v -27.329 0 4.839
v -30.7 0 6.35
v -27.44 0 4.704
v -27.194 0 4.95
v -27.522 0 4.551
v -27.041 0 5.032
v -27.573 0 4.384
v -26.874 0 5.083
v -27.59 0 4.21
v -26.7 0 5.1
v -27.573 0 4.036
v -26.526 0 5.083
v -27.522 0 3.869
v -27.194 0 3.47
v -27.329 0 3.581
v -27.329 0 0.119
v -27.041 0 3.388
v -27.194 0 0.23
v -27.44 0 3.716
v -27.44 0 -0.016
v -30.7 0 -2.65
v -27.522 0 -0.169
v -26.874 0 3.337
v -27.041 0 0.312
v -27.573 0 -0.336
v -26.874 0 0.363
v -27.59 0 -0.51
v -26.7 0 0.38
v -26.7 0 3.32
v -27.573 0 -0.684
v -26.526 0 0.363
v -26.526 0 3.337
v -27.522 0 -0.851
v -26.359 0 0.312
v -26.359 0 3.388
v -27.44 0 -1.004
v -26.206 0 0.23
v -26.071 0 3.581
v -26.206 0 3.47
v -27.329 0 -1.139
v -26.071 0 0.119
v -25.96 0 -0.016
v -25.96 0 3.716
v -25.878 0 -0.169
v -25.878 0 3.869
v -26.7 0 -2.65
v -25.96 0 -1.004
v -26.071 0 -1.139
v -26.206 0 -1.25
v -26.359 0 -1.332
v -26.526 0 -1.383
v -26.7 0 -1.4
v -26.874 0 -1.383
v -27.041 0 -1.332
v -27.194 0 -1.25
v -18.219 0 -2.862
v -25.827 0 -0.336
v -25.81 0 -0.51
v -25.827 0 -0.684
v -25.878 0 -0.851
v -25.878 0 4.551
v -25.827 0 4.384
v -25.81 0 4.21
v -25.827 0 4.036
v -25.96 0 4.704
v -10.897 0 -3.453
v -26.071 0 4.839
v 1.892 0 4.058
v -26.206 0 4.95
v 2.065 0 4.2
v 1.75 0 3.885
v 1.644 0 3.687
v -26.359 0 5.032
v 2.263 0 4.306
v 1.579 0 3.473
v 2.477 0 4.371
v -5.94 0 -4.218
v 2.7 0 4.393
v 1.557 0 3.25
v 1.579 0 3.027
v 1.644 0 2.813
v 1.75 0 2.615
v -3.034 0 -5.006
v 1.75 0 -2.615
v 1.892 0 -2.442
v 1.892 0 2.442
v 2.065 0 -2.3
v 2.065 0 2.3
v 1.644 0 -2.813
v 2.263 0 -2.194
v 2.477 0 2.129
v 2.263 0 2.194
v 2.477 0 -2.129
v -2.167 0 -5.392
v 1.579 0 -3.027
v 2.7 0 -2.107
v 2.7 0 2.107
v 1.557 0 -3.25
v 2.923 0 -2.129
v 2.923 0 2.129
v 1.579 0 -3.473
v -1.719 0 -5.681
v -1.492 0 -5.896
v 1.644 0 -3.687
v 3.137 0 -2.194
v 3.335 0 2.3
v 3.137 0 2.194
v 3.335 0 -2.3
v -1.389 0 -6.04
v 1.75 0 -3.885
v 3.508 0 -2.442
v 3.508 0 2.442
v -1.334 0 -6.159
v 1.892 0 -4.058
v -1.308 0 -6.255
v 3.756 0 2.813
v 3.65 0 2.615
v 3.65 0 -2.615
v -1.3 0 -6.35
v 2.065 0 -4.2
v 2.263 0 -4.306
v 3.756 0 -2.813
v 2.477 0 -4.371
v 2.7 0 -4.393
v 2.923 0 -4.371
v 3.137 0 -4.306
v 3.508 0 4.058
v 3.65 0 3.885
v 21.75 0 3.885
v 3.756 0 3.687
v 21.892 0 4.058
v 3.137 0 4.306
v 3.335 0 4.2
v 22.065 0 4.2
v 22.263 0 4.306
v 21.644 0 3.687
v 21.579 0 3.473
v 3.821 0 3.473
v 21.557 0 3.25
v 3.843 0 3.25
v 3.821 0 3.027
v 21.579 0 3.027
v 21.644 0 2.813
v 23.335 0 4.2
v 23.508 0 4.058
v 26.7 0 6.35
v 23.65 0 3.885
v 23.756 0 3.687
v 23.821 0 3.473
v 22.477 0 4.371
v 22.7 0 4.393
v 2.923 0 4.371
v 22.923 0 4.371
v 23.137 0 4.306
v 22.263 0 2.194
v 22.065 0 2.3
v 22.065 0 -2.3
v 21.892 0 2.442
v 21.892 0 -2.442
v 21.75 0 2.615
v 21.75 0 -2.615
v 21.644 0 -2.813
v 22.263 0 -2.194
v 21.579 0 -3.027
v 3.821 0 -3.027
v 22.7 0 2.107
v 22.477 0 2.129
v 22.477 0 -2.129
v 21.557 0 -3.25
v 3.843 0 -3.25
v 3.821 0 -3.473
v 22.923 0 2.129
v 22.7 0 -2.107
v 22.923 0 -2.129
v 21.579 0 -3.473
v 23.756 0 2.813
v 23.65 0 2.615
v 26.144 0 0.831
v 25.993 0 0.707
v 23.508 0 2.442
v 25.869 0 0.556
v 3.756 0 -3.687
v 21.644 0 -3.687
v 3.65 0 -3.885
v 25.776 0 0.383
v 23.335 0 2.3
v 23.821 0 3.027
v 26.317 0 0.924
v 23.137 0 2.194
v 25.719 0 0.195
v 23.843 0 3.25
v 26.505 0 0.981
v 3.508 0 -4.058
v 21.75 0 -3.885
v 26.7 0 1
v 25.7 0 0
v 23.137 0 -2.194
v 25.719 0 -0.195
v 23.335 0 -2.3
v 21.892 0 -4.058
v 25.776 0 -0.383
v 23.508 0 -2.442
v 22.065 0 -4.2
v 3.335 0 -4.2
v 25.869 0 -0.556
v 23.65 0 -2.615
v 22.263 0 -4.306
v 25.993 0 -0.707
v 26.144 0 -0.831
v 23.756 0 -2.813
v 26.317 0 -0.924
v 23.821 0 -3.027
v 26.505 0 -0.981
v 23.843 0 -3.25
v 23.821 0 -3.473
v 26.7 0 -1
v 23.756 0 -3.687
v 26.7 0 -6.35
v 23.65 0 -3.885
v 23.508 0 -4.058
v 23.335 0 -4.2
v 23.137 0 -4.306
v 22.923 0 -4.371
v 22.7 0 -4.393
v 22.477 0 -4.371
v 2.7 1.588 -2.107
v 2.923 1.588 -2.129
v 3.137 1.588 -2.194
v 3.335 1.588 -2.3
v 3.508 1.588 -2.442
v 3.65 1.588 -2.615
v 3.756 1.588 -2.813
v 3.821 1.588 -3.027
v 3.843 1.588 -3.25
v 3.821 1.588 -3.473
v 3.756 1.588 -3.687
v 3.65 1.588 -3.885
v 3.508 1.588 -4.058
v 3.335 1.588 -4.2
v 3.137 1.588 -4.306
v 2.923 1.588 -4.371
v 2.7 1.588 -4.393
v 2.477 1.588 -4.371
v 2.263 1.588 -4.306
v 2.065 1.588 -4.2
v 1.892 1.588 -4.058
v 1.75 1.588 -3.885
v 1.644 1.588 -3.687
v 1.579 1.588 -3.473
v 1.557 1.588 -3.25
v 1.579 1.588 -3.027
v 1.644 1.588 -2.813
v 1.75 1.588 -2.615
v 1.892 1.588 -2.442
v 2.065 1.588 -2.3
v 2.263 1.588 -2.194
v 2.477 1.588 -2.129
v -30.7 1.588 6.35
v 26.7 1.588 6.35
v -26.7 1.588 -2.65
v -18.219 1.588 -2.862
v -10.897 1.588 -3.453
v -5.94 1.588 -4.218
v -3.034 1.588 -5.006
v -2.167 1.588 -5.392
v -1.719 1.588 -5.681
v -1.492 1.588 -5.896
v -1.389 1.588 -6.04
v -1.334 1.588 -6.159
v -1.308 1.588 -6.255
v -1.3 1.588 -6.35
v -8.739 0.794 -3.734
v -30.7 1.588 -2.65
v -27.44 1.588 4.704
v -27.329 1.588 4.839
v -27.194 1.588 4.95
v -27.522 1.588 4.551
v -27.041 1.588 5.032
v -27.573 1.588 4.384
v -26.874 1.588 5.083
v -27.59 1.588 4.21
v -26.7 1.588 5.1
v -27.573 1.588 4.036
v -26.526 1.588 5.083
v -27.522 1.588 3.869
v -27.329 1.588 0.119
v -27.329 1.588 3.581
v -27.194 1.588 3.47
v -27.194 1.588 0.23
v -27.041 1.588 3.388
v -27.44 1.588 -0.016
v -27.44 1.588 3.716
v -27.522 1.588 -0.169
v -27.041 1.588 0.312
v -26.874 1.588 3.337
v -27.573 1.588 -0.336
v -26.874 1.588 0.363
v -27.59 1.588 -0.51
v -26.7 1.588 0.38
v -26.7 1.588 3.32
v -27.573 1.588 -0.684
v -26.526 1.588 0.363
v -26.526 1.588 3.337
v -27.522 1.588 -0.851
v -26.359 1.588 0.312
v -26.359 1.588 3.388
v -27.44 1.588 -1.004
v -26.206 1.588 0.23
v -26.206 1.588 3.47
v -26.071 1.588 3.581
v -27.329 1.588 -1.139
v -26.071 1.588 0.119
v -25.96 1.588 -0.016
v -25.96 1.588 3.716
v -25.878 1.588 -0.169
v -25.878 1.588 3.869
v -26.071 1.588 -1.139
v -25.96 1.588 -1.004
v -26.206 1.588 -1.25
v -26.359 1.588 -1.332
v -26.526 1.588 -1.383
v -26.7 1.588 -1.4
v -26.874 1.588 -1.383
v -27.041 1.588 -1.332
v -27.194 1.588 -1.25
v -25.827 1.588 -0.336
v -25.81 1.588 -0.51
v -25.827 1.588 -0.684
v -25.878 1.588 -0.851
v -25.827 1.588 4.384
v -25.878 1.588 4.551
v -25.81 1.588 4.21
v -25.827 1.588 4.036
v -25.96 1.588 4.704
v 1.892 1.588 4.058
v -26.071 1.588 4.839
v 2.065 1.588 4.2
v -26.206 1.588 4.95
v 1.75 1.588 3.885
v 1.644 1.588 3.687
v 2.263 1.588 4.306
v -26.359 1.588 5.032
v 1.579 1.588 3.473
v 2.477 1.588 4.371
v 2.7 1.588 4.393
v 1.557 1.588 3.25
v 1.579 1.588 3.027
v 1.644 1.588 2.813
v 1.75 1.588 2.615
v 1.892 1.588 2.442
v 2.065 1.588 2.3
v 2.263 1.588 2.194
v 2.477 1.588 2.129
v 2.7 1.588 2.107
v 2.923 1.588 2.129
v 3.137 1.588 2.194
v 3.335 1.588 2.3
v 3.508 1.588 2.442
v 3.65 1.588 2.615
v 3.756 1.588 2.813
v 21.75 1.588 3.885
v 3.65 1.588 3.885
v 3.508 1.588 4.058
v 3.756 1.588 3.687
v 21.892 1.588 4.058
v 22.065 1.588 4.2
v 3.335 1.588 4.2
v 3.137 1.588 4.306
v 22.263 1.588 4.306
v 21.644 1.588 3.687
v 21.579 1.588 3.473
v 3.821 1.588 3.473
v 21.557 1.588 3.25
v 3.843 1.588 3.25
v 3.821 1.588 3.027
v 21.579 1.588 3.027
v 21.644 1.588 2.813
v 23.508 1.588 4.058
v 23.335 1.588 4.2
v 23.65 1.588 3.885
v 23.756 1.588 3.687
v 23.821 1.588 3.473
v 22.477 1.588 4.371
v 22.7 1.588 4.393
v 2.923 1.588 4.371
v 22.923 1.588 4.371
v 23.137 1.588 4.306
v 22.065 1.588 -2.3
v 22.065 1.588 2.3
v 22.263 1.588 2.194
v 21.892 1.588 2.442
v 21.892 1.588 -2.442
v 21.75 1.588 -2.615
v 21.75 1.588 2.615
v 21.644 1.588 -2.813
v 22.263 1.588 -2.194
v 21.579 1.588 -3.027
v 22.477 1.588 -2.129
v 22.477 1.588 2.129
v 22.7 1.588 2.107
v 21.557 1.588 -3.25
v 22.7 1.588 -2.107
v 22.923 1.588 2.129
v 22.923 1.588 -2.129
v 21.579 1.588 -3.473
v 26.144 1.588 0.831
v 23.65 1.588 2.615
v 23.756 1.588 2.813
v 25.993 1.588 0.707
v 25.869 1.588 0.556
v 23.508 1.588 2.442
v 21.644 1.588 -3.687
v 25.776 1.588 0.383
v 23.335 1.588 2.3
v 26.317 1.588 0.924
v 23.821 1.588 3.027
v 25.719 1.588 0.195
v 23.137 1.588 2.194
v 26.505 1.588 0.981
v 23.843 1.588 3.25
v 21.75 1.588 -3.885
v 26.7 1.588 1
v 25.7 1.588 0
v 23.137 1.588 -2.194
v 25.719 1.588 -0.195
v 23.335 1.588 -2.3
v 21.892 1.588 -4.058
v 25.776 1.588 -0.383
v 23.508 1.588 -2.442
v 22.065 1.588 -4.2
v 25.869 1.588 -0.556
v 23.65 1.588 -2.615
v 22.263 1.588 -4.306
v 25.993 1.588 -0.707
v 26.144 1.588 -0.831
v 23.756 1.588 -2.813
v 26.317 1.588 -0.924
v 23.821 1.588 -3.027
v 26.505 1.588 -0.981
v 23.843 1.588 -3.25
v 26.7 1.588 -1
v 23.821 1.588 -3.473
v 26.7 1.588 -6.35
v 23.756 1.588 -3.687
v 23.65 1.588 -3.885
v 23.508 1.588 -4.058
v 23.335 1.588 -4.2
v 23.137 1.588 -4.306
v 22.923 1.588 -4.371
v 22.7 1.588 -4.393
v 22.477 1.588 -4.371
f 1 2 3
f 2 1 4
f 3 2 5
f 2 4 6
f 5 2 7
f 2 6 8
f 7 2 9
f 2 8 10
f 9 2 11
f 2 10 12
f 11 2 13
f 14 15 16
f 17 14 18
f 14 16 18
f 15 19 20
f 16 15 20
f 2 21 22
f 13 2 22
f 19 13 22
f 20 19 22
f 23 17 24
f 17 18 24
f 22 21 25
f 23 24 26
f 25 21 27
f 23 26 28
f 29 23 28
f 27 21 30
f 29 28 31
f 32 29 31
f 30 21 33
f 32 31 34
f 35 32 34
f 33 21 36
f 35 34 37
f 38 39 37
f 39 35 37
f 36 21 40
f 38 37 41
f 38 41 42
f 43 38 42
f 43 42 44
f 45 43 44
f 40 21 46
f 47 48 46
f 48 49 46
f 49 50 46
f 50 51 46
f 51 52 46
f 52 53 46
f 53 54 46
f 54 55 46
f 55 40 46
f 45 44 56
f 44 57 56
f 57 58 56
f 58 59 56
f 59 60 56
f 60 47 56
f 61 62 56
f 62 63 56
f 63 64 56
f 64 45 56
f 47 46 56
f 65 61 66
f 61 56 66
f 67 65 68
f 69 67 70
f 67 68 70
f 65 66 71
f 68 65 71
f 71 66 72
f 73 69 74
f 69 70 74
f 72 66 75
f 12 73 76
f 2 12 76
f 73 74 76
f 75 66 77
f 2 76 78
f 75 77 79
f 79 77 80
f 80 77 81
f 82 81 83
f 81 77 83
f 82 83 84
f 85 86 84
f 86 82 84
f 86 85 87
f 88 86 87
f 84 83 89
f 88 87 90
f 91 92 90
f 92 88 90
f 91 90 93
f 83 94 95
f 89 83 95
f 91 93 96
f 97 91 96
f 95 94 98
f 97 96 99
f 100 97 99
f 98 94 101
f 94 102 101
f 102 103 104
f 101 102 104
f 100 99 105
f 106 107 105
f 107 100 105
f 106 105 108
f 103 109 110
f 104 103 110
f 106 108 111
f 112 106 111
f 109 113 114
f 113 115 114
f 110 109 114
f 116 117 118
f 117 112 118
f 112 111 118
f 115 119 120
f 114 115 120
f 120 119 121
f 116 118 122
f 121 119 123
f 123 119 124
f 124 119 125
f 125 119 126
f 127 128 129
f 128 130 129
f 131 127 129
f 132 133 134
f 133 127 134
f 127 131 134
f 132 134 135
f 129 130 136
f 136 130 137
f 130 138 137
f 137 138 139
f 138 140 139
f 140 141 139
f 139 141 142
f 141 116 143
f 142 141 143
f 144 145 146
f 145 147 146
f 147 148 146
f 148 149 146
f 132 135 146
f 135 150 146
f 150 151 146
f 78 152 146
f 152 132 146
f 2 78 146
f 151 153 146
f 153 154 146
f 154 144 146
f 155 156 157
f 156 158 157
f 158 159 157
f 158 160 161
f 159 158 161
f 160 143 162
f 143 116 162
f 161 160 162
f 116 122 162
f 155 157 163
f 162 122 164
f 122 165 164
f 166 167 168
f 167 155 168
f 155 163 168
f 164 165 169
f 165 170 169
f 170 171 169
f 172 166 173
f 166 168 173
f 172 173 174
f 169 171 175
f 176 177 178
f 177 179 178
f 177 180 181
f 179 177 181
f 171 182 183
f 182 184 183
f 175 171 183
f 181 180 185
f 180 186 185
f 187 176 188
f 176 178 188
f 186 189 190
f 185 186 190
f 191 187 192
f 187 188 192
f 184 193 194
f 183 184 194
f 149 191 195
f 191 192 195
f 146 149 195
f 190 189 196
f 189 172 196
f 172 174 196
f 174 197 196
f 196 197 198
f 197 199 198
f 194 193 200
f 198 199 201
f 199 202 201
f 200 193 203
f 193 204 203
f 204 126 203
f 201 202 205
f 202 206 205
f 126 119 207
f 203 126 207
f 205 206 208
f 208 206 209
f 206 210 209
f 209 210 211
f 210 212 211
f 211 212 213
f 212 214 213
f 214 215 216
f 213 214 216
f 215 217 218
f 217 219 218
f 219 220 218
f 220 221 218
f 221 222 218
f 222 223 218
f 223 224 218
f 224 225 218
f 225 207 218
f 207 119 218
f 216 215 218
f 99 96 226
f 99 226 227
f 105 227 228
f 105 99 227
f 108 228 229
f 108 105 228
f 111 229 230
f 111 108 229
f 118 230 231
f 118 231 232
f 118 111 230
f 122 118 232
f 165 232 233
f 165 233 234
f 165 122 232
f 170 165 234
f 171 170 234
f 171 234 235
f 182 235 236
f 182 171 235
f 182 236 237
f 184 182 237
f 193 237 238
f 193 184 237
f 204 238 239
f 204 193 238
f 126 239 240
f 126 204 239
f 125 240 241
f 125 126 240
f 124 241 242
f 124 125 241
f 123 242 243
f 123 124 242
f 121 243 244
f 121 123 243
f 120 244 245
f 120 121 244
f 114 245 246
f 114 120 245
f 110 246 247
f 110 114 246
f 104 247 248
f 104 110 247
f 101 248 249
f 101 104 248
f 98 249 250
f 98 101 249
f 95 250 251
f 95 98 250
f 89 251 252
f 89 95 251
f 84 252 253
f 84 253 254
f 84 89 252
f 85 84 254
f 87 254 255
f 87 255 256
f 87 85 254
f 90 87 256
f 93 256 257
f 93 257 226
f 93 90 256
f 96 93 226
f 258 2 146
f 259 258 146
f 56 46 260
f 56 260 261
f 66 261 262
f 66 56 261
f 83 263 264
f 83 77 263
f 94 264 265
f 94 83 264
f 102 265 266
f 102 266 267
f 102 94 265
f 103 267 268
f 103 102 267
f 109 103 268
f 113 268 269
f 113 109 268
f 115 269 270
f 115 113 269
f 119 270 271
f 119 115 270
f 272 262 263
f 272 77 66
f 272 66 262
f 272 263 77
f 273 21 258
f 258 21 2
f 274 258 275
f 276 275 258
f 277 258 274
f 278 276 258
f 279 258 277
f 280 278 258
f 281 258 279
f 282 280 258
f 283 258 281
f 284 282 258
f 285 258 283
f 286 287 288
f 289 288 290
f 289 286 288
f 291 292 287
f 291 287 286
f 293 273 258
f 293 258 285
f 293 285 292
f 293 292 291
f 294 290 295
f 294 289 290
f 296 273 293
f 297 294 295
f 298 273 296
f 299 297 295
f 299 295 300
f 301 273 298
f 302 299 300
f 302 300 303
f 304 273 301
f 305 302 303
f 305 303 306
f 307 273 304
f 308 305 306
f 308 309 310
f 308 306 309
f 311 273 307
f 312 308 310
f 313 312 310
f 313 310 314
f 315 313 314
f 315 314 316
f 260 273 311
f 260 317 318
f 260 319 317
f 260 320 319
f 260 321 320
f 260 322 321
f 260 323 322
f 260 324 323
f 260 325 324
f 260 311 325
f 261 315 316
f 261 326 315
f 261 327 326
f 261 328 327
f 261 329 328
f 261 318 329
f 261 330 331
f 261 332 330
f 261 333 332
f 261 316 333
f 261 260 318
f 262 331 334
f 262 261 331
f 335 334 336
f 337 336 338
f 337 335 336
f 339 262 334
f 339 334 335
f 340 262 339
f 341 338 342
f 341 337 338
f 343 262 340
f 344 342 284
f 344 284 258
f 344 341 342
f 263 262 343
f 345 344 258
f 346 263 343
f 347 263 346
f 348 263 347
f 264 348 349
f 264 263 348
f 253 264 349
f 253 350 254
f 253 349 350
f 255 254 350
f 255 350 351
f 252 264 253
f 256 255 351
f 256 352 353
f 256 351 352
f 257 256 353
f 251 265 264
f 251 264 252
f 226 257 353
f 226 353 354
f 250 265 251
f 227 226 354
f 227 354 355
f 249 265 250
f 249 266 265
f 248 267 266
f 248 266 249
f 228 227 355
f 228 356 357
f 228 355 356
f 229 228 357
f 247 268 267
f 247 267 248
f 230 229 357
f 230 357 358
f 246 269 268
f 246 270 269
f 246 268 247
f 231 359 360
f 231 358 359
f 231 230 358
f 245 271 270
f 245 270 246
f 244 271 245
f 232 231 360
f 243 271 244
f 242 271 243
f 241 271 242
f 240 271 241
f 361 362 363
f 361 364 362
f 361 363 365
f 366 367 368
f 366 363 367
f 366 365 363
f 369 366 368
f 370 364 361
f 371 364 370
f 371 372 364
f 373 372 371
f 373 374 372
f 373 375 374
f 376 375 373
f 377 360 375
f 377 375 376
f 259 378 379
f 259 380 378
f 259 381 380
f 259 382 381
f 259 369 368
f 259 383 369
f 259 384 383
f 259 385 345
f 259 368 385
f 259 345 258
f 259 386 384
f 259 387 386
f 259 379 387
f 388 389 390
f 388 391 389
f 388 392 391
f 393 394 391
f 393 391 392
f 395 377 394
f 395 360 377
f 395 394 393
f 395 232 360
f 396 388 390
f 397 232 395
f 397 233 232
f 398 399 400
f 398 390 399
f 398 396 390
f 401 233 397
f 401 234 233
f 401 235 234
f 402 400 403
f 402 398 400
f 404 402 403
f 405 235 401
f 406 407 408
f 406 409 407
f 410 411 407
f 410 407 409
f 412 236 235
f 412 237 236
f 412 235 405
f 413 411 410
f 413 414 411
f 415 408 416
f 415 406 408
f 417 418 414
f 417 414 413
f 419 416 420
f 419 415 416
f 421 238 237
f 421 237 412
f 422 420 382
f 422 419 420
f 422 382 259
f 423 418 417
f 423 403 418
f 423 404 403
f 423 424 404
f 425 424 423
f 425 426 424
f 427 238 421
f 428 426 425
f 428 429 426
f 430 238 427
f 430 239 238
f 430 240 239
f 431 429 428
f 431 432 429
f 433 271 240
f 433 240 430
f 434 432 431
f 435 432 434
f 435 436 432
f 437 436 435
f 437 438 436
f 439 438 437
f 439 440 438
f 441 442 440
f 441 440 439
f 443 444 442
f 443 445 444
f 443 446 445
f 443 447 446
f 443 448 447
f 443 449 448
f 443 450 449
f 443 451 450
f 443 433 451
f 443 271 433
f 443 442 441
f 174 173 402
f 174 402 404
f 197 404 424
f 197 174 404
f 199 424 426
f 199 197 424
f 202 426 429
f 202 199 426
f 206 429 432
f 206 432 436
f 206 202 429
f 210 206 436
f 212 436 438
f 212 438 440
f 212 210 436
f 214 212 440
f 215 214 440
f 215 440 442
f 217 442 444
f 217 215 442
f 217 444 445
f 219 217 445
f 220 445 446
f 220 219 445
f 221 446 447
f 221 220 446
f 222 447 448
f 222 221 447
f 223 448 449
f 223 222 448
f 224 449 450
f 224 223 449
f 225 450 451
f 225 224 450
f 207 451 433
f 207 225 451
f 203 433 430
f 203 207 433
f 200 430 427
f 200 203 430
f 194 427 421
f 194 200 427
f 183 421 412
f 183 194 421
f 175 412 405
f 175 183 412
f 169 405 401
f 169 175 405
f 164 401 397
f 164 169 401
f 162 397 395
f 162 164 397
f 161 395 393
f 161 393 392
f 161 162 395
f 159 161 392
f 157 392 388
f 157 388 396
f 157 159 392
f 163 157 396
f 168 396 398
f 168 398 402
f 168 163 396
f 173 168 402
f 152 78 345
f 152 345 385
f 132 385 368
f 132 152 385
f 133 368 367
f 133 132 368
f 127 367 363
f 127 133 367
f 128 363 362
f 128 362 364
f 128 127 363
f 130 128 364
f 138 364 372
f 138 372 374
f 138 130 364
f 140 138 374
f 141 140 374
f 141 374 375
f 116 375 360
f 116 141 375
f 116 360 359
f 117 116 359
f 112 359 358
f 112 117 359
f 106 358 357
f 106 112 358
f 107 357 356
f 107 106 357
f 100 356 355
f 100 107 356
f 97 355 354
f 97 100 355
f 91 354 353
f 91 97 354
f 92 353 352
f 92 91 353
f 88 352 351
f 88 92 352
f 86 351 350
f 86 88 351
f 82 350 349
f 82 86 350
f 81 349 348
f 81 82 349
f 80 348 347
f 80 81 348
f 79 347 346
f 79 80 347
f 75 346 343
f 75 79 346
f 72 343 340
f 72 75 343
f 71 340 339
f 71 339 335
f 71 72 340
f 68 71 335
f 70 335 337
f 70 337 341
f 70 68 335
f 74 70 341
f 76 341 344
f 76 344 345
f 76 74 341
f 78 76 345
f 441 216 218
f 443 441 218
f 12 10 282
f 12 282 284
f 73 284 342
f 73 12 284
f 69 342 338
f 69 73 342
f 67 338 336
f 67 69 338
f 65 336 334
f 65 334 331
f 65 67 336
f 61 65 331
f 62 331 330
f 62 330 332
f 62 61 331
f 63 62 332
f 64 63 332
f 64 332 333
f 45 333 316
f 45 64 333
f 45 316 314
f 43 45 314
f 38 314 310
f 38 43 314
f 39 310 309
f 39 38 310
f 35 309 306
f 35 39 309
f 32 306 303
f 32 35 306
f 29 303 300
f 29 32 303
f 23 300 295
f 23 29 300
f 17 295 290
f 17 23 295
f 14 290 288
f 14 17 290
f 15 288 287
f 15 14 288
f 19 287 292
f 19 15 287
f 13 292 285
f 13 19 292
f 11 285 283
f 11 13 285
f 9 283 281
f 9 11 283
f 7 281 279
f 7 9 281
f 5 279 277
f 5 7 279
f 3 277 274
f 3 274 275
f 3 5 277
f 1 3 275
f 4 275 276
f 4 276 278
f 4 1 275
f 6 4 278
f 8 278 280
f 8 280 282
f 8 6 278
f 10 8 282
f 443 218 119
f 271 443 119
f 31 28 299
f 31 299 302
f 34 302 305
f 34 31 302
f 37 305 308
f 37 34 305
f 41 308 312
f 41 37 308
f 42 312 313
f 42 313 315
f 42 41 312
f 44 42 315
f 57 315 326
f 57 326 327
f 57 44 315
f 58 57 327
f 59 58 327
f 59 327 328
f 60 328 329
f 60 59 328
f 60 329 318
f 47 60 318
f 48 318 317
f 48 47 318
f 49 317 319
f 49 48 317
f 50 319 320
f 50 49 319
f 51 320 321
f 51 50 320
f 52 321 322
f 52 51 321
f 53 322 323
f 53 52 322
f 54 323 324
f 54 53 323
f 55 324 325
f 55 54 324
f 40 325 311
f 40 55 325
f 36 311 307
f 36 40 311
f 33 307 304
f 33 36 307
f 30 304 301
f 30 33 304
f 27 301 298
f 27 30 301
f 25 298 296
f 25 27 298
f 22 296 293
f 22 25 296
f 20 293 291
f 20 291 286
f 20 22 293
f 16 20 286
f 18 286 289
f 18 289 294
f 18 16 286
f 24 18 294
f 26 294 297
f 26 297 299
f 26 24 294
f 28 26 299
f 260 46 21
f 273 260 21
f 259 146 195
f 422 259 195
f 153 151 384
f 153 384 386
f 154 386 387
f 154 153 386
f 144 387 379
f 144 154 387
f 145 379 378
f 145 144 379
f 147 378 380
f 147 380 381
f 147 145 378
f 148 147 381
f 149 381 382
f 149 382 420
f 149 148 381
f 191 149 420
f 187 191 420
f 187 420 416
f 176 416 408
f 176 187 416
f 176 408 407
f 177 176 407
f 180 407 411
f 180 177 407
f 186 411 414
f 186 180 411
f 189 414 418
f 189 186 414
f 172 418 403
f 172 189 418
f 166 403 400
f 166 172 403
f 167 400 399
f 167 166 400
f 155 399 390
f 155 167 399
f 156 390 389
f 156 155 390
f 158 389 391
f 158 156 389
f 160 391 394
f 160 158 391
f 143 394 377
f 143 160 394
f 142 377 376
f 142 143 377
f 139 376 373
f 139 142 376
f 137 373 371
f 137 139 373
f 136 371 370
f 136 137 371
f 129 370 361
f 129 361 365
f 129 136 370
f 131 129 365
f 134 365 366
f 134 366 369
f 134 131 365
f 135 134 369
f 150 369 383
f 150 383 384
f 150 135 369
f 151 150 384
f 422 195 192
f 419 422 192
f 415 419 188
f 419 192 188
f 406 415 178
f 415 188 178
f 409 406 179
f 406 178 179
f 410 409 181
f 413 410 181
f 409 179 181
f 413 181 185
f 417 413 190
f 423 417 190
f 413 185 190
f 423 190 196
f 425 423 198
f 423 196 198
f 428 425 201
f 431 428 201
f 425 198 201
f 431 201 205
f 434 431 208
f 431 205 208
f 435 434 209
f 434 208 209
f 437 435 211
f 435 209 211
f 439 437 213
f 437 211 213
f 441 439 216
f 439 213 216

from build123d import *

# Parameters (mm, degrees)
SKETCH1_R           = 0.89
SKETCH1_R_2         = 1.143
BOSS_EXTRUDE1_DEPTH = 1.5875


with BuildPart() as part:
    # Sketch1 → Boss-Extrude1 (new body)
    with BuildSketch(Plane(origin=(0, 0, 0), x_dir=(1, 0, 0), z_dir=(0, 1, 0))):
        with BuildLine():
            Line((-26.7, -6.35), (26.7, -6.35))
            Line((26.7, -6.35), (26.7, -1))
            ThreePointArc((26.7, -1), (25.7, 0), (26.7, 1))
            Line((26.7, 1), (26.7, 6.35))
            Line((26.7, 6.35), (-1.3, 6.35))
            add(Edge.make_bspline(
                [(-26.7, 2.65), (-1.3, 2.65), (-1.3, 6.35)],
                knots=[4.71238898, 4.71238898, 4.71238898, 6.283185307, 6.283185307, 6.283185307], degree=2, weights=[1, 0.707106781, 1]))
            Line((-26.7, 2.65), (-30.7, 2.65))
            Line((-30.7, 2.65), (-30.7, -6.35))
            Line((-30.7, -6.35), (-26.7, -6.35))
        make_face()
        with Locations(Location((-26.7, 0.51, 0), (0, 0, 270))):
            Circle(SKETCH1_R, mode=Mode.SUBTRACT)
        with Locations(Location((-26.7, -4.21, 0), (0, 0, 270))):
            Circle(SKETCH1_R, mode=Mode.SUBTRACT)
        with Locations(Location((2.7, 3.25, 0), (0, 0, 270))):
            Circle(SKETCH1_R_2, mode=Mode.SUBTRACT)
        with Locations(Location((2.7, -3.25, 0), (0, 0, 270))):
            Circle(SKETCH1_R_2, mode=Mode.SUBTRACT)
        with Locations(Location((22.7, 3.25, 0), (0, 0, 270))):
            Circle(SKETCH1_R_2, mode=Mode.SUBTRACT)
        with Locations(Location((22.7, -3.25, 0), (0, 0, 270))):
            Circle(SKETCH1_R_2, mode=Mode.SUBTRACT)
    extrude(amount=BOSS_EXTRUDE1_DEPTH)


solid = part.part
